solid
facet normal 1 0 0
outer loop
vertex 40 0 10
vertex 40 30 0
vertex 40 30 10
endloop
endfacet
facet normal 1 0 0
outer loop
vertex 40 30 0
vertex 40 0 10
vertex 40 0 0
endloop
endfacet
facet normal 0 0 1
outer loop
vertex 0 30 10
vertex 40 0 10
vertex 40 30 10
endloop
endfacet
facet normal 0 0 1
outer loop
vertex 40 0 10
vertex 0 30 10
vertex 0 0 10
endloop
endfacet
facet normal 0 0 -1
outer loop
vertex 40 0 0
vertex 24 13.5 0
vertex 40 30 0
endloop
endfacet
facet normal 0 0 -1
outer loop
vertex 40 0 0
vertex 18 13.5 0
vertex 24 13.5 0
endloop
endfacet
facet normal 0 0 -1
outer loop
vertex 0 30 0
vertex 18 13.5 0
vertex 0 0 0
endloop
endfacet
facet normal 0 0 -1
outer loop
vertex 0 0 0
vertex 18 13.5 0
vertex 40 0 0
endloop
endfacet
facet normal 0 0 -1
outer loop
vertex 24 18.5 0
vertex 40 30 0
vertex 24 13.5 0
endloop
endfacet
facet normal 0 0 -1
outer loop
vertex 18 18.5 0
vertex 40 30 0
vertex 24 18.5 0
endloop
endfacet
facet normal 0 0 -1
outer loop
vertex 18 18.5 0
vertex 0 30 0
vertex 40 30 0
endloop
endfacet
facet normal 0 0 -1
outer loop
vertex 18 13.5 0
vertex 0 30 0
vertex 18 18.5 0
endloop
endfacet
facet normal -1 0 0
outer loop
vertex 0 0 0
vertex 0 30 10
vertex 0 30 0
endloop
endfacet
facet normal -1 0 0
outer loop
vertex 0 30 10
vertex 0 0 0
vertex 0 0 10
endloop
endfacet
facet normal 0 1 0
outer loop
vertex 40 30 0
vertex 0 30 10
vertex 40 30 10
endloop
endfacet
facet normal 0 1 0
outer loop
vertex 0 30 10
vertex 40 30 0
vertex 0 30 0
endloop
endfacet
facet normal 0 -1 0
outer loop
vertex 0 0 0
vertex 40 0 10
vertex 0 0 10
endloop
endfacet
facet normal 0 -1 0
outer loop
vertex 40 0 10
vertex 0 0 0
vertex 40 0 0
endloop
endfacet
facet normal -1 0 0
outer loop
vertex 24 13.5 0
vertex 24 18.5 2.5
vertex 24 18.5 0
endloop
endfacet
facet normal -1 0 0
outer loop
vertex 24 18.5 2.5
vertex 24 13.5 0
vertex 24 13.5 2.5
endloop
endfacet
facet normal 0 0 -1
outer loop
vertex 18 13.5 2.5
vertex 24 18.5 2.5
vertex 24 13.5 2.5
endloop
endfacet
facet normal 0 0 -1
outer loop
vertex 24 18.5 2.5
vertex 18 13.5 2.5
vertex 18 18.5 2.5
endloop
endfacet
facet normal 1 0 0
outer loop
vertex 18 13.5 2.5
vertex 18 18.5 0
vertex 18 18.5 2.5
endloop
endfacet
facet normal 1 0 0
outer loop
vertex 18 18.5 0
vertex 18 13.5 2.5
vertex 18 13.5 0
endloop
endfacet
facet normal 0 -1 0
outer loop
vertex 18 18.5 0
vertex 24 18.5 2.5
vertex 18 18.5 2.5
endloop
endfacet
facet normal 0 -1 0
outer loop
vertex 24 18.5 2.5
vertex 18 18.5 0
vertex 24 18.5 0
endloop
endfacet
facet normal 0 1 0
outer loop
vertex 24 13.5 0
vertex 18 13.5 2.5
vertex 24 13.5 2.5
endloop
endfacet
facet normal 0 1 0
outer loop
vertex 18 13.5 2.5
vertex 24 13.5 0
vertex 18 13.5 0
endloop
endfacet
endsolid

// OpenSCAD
// units=mm — generated by scad_emitter.py
// part=unnamed
$fn = 48;

difference() { cube([40, 30, 10]); translate([18, 13.5, -0.5]) cube([6, 5, 3]); }
